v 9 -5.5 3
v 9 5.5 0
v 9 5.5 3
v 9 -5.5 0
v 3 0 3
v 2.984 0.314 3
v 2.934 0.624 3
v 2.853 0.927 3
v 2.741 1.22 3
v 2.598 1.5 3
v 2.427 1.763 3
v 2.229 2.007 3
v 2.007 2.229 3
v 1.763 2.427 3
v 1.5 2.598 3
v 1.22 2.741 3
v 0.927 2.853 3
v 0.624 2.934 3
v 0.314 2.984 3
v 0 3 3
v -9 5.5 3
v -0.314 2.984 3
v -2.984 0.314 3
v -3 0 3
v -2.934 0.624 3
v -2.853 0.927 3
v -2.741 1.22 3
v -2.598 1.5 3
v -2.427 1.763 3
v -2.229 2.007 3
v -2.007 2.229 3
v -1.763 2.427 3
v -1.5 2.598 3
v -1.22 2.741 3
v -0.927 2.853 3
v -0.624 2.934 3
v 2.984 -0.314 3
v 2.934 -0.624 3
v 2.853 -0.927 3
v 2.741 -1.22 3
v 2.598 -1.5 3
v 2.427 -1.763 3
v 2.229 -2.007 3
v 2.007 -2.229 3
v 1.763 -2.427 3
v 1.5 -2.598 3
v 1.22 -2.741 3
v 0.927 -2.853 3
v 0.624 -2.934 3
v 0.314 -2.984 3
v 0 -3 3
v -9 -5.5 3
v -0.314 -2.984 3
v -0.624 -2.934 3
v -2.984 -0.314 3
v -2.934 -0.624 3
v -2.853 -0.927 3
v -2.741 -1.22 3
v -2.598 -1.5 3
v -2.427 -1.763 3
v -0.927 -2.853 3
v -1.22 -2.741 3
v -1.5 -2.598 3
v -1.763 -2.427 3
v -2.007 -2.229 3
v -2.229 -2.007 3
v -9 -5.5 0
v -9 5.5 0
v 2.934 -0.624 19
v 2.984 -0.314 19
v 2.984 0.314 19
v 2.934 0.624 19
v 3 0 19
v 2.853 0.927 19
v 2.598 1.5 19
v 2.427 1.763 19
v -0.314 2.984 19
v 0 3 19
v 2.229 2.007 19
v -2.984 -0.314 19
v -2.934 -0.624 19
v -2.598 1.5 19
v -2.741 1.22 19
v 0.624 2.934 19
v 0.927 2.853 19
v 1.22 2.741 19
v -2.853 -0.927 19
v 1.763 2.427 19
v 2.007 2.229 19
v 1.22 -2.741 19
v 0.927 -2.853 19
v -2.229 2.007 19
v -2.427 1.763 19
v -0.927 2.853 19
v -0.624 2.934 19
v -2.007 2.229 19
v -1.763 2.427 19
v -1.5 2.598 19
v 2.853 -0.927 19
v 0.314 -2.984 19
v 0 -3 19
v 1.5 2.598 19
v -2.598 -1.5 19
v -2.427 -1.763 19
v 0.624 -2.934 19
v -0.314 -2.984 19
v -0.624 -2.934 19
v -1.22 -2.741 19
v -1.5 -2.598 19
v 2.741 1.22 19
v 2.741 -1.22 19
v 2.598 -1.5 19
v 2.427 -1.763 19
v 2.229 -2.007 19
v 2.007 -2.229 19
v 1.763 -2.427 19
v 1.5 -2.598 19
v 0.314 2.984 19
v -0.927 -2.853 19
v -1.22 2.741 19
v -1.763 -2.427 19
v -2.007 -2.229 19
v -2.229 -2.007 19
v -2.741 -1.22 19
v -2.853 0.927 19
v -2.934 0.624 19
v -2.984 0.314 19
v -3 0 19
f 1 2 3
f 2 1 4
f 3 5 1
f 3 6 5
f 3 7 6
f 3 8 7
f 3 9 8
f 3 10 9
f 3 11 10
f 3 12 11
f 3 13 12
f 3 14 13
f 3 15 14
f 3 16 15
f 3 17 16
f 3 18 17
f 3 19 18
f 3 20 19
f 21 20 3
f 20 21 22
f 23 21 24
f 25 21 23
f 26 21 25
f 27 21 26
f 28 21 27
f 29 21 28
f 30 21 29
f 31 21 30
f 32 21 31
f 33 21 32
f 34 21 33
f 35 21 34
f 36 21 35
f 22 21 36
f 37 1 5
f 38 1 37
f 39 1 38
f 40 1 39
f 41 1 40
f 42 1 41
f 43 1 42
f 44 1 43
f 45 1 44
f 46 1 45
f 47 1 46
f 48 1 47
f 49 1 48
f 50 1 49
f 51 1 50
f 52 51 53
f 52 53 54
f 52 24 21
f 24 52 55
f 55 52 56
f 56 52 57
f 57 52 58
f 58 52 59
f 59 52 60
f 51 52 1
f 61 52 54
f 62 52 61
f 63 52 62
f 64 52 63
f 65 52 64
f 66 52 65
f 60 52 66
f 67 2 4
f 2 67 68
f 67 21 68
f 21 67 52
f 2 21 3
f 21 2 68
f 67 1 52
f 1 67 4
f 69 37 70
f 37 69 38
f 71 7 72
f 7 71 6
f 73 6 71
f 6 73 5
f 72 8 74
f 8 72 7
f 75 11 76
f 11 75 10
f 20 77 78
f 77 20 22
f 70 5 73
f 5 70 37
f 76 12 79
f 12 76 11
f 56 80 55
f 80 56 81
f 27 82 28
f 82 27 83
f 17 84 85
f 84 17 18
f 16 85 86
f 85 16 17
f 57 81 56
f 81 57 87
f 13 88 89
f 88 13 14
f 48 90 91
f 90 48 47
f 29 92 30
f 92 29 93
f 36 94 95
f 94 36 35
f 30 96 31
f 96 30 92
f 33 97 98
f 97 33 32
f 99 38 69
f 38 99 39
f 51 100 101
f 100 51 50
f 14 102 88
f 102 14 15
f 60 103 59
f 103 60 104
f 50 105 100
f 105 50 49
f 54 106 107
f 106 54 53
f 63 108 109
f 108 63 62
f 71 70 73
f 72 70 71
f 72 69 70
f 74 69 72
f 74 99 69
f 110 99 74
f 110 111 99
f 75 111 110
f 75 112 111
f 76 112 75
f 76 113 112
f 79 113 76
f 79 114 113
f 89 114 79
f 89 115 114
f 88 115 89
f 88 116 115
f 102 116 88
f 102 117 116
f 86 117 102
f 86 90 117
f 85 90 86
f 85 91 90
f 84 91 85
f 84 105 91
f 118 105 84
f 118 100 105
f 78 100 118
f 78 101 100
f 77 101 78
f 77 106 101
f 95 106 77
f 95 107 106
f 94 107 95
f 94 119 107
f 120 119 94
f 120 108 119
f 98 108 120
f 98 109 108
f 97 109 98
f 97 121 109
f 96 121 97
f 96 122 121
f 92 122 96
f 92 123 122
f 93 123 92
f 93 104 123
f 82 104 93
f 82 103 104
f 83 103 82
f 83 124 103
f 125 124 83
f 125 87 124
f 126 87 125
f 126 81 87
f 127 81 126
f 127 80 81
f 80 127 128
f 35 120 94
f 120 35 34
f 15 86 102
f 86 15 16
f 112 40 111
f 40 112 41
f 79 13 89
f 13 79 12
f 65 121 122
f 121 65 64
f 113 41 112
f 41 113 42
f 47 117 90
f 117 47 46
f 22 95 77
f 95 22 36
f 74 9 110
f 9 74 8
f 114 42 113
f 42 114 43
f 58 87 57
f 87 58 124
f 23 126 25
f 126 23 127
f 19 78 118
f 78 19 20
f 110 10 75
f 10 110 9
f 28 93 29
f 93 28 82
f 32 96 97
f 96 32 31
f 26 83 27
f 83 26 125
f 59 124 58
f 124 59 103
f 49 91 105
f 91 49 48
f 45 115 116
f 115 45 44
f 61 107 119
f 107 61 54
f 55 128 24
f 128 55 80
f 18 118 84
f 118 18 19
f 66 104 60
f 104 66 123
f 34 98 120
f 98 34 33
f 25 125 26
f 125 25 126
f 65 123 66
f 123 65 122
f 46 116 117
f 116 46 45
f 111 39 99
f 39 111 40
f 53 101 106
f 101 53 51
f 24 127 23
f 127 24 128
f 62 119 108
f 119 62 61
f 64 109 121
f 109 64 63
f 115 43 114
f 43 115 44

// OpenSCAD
// T-head slot bolt.
$fn = 60;
eps = 0.02;
shaft_d = 6;
head_l = 18;
shaft_l = 16;
head_w = shaft_d + 5;
head_h = 3;
union() {
    translate([-head_l/2,-head_w/2,0]) cube([head_l,head_w,head_h]);
    translate([0,0,head_h]) cylinder(d=shaft_d,h=shaft_l);
}
